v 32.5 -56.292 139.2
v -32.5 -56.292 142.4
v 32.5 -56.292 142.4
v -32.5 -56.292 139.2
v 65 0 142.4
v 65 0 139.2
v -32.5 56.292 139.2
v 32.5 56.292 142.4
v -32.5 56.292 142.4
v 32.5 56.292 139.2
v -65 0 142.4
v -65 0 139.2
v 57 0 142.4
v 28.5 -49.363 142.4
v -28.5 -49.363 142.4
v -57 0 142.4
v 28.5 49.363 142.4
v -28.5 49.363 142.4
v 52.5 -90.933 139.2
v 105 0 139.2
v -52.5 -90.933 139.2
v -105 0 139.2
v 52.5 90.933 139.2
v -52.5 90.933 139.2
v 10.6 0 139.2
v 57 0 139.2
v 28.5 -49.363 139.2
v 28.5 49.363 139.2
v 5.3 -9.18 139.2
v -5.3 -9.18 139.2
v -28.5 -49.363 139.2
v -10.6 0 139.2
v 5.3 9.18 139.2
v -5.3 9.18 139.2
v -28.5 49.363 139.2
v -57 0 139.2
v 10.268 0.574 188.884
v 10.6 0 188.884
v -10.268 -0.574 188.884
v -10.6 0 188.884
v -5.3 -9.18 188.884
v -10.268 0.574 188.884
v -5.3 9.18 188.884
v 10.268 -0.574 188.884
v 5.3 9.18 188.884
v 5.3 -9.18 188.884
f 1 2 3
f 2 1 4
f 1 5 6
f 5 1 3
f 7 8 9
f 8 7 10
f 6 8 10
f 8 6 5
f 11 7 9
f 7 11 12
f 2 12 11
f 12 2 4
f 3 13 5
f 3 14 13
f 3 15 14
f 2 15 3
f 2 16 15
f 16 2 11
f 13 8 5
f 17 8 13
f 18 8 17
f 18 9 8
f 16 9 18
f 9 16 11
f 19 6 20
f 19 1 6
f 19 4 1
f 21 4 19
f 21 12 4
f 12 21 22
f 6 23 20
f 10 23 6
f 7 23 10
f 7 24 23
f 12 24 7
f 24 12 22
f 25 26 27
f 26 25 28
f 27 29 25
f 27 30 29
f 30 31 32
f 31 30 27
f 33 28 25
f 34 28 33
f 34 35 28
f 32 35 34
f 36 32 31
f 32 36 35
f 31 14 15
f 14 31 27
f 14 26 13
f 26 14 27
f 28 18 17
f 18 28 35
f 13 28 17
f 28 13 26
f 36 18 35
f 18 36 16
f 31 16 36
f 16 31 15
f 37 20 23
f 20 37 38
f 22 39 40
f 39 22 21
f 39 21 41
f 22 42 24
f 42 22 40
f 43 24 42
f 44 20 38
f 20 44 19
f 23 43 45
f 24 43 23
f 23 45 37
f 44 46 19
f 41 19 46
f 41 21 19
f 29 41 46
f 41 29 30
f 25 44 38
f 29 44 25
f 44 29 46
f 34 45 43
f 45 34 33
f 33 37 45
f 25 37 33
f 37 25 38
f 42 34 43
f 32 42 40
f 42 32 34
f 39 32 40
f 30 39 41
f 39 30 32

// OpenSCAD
// Simple Bird Feeder
// Joe Wingbermuehle
// 2018-03-13

// Size of the print area (used to make the feeder as big as possible):
print_width = 210;
print_height = 200;

sides = 6;                          // Number of sides (to change the shape).
tolerance = 0.2;                    // Tolerance for the pole
wall_width = 4 * tolerance;         // Width of walls

// Height parameters based off the print height.
top_height = 50;                    // Height of the roof
hanger_height = 10;                 // Height of the hanger (amount above the roof).
base_height = 25;                   // Height of the base
hopper_height = print_height - top_height - hanger_height - wall_width;

// Radius/width parameters based off the print width.
top_overhang_radius = 4;
base_radius = print_width / 2 - top_overhang_radius;          // Radius of the base area
hopper_radius = base_radius - 40;       // Radius of the hopper (leaves some room for the feed area)
pole_radius = 10;
perch_radius = 4;

// Drainage hole parameters.
hole_count = 8;         // Number of drainage holes in the base (will be limited to the number of sides)
hole_radius = 2;        // Radius of the drainage holes.

// The number of sides of various components.
hopper_sides = sides;
base_sides = sides;
top_sides = sides;

overhang = base_radius - hopper_radius;
roof_height_at_hopper = overhang * top_height / (base_radius - pole_radius);

module hopper() {
    difference() {
        // Outside
        cylinder(hopper_height, hopper_radius, hopper_radius, $fn = hopper_sides);
        
        // Inside cutout
        cylinder(hopper_height, hopper_radius - wall_width, hopper_radius - wall_width, $fn = hopper_sides);
        
        // Seed cutout.
        rotate([0, 0, 180 / hopper_sides]) {
            bottom_radius = hopper_radius * (1 + 0.5 / hopper_sides);
            cylinder(base_height * 0.75, bottom_radius, hopper_radius, $fn = hopper_sides);
        }
    }
}

module base() {
    
    // Seed area
    difference() {
        cylinder(base_height, base_radius, base_radius, $fn = base_sides);
        cylinder(base_height, base_radius - wall_width, base_radius - wall_width, $fn = base_sides);
    }
    
    // Bottom
    difference() {
        cylinder(wall_width, base_radius, base_radius, $fn = base_sides);
        for(i = [0 : min(sides, hole_count) - 1]) {
            angle_offset = 90;
            hole_offset = hopper_radius + (base_radius - hopper_radius) / 2;
            translate([
                sin(360 * i / min(sides, hole_count) + angle_offset) * hole_offset,
                cos(360 * i / min(sides, hole_count) + angle_offset) * hole_offset,
                0
            ]) {
                cylinder(wall_width, hole_radius, hole_radius);
            }
        }
    }
    
    // Perch
    face_length = 2 * base_radius * sin(180 / base_sides);
    for(i = [0 : base_sides - 1]) {
        angle_offset = 180 / base_sides;
        rotate([0, 0, 360 * i / base_sides + angle_offset]) {
            translate([base_radius * cos(180 / base_sides), 0, base_height]) {
                rotate([90, 0, 0]) {
                    translate([0, 0, -face_length / 2]) {
                        cylinder(face_length, perch_radius, perch_radius);
                        sphere(perch_radius);
                    }
                }
            }
        }
    }

    // Funnel
    cylinder(base_height, hopper_radius, 1, $fn = base_sides);
    
    // Pole
    difference() {
        cylinder(hopper_height + top_height + hanger_height, pole_radius, pole_radius, $fn = base_sides);
        translate([0, pole_radius, hopper_height + top_height + hanger_height / 2]) {
            rotate([90, 0, 0]) {
                cylinder(pole_radius * 2, pole_radius / 4, pole_radius / 4); 
            }
        }
    }
}

module top() {
    translate([0, 0, hopper_height]) {
        difference() {
            cylinder(
                top_height,
                base_radius + top_overhang_radius,
                pole_radius,
                $fn = top_sides
            );
            cylinder(
                top_height,
                pole_radius + tolerance * 3,
                pole_radius + tolerance * 3,
                $fn = base_sides
            );
            difference() {
                cylinder(
                    wall_width * 4,
                    hopper_radius + wall_width * 5,
                    hopper_radius + wall_width * 5,
                    $fn = hopper_sides
                );
                cylinder(
                    wall_width * 4,
                    hopper_radius - wall_width * 5,
                    hopper_radius - wall_width * 5,
                    $fn = hopper_sides
                );
            }
        }
    }
}

//hopper();
//base();
top();
